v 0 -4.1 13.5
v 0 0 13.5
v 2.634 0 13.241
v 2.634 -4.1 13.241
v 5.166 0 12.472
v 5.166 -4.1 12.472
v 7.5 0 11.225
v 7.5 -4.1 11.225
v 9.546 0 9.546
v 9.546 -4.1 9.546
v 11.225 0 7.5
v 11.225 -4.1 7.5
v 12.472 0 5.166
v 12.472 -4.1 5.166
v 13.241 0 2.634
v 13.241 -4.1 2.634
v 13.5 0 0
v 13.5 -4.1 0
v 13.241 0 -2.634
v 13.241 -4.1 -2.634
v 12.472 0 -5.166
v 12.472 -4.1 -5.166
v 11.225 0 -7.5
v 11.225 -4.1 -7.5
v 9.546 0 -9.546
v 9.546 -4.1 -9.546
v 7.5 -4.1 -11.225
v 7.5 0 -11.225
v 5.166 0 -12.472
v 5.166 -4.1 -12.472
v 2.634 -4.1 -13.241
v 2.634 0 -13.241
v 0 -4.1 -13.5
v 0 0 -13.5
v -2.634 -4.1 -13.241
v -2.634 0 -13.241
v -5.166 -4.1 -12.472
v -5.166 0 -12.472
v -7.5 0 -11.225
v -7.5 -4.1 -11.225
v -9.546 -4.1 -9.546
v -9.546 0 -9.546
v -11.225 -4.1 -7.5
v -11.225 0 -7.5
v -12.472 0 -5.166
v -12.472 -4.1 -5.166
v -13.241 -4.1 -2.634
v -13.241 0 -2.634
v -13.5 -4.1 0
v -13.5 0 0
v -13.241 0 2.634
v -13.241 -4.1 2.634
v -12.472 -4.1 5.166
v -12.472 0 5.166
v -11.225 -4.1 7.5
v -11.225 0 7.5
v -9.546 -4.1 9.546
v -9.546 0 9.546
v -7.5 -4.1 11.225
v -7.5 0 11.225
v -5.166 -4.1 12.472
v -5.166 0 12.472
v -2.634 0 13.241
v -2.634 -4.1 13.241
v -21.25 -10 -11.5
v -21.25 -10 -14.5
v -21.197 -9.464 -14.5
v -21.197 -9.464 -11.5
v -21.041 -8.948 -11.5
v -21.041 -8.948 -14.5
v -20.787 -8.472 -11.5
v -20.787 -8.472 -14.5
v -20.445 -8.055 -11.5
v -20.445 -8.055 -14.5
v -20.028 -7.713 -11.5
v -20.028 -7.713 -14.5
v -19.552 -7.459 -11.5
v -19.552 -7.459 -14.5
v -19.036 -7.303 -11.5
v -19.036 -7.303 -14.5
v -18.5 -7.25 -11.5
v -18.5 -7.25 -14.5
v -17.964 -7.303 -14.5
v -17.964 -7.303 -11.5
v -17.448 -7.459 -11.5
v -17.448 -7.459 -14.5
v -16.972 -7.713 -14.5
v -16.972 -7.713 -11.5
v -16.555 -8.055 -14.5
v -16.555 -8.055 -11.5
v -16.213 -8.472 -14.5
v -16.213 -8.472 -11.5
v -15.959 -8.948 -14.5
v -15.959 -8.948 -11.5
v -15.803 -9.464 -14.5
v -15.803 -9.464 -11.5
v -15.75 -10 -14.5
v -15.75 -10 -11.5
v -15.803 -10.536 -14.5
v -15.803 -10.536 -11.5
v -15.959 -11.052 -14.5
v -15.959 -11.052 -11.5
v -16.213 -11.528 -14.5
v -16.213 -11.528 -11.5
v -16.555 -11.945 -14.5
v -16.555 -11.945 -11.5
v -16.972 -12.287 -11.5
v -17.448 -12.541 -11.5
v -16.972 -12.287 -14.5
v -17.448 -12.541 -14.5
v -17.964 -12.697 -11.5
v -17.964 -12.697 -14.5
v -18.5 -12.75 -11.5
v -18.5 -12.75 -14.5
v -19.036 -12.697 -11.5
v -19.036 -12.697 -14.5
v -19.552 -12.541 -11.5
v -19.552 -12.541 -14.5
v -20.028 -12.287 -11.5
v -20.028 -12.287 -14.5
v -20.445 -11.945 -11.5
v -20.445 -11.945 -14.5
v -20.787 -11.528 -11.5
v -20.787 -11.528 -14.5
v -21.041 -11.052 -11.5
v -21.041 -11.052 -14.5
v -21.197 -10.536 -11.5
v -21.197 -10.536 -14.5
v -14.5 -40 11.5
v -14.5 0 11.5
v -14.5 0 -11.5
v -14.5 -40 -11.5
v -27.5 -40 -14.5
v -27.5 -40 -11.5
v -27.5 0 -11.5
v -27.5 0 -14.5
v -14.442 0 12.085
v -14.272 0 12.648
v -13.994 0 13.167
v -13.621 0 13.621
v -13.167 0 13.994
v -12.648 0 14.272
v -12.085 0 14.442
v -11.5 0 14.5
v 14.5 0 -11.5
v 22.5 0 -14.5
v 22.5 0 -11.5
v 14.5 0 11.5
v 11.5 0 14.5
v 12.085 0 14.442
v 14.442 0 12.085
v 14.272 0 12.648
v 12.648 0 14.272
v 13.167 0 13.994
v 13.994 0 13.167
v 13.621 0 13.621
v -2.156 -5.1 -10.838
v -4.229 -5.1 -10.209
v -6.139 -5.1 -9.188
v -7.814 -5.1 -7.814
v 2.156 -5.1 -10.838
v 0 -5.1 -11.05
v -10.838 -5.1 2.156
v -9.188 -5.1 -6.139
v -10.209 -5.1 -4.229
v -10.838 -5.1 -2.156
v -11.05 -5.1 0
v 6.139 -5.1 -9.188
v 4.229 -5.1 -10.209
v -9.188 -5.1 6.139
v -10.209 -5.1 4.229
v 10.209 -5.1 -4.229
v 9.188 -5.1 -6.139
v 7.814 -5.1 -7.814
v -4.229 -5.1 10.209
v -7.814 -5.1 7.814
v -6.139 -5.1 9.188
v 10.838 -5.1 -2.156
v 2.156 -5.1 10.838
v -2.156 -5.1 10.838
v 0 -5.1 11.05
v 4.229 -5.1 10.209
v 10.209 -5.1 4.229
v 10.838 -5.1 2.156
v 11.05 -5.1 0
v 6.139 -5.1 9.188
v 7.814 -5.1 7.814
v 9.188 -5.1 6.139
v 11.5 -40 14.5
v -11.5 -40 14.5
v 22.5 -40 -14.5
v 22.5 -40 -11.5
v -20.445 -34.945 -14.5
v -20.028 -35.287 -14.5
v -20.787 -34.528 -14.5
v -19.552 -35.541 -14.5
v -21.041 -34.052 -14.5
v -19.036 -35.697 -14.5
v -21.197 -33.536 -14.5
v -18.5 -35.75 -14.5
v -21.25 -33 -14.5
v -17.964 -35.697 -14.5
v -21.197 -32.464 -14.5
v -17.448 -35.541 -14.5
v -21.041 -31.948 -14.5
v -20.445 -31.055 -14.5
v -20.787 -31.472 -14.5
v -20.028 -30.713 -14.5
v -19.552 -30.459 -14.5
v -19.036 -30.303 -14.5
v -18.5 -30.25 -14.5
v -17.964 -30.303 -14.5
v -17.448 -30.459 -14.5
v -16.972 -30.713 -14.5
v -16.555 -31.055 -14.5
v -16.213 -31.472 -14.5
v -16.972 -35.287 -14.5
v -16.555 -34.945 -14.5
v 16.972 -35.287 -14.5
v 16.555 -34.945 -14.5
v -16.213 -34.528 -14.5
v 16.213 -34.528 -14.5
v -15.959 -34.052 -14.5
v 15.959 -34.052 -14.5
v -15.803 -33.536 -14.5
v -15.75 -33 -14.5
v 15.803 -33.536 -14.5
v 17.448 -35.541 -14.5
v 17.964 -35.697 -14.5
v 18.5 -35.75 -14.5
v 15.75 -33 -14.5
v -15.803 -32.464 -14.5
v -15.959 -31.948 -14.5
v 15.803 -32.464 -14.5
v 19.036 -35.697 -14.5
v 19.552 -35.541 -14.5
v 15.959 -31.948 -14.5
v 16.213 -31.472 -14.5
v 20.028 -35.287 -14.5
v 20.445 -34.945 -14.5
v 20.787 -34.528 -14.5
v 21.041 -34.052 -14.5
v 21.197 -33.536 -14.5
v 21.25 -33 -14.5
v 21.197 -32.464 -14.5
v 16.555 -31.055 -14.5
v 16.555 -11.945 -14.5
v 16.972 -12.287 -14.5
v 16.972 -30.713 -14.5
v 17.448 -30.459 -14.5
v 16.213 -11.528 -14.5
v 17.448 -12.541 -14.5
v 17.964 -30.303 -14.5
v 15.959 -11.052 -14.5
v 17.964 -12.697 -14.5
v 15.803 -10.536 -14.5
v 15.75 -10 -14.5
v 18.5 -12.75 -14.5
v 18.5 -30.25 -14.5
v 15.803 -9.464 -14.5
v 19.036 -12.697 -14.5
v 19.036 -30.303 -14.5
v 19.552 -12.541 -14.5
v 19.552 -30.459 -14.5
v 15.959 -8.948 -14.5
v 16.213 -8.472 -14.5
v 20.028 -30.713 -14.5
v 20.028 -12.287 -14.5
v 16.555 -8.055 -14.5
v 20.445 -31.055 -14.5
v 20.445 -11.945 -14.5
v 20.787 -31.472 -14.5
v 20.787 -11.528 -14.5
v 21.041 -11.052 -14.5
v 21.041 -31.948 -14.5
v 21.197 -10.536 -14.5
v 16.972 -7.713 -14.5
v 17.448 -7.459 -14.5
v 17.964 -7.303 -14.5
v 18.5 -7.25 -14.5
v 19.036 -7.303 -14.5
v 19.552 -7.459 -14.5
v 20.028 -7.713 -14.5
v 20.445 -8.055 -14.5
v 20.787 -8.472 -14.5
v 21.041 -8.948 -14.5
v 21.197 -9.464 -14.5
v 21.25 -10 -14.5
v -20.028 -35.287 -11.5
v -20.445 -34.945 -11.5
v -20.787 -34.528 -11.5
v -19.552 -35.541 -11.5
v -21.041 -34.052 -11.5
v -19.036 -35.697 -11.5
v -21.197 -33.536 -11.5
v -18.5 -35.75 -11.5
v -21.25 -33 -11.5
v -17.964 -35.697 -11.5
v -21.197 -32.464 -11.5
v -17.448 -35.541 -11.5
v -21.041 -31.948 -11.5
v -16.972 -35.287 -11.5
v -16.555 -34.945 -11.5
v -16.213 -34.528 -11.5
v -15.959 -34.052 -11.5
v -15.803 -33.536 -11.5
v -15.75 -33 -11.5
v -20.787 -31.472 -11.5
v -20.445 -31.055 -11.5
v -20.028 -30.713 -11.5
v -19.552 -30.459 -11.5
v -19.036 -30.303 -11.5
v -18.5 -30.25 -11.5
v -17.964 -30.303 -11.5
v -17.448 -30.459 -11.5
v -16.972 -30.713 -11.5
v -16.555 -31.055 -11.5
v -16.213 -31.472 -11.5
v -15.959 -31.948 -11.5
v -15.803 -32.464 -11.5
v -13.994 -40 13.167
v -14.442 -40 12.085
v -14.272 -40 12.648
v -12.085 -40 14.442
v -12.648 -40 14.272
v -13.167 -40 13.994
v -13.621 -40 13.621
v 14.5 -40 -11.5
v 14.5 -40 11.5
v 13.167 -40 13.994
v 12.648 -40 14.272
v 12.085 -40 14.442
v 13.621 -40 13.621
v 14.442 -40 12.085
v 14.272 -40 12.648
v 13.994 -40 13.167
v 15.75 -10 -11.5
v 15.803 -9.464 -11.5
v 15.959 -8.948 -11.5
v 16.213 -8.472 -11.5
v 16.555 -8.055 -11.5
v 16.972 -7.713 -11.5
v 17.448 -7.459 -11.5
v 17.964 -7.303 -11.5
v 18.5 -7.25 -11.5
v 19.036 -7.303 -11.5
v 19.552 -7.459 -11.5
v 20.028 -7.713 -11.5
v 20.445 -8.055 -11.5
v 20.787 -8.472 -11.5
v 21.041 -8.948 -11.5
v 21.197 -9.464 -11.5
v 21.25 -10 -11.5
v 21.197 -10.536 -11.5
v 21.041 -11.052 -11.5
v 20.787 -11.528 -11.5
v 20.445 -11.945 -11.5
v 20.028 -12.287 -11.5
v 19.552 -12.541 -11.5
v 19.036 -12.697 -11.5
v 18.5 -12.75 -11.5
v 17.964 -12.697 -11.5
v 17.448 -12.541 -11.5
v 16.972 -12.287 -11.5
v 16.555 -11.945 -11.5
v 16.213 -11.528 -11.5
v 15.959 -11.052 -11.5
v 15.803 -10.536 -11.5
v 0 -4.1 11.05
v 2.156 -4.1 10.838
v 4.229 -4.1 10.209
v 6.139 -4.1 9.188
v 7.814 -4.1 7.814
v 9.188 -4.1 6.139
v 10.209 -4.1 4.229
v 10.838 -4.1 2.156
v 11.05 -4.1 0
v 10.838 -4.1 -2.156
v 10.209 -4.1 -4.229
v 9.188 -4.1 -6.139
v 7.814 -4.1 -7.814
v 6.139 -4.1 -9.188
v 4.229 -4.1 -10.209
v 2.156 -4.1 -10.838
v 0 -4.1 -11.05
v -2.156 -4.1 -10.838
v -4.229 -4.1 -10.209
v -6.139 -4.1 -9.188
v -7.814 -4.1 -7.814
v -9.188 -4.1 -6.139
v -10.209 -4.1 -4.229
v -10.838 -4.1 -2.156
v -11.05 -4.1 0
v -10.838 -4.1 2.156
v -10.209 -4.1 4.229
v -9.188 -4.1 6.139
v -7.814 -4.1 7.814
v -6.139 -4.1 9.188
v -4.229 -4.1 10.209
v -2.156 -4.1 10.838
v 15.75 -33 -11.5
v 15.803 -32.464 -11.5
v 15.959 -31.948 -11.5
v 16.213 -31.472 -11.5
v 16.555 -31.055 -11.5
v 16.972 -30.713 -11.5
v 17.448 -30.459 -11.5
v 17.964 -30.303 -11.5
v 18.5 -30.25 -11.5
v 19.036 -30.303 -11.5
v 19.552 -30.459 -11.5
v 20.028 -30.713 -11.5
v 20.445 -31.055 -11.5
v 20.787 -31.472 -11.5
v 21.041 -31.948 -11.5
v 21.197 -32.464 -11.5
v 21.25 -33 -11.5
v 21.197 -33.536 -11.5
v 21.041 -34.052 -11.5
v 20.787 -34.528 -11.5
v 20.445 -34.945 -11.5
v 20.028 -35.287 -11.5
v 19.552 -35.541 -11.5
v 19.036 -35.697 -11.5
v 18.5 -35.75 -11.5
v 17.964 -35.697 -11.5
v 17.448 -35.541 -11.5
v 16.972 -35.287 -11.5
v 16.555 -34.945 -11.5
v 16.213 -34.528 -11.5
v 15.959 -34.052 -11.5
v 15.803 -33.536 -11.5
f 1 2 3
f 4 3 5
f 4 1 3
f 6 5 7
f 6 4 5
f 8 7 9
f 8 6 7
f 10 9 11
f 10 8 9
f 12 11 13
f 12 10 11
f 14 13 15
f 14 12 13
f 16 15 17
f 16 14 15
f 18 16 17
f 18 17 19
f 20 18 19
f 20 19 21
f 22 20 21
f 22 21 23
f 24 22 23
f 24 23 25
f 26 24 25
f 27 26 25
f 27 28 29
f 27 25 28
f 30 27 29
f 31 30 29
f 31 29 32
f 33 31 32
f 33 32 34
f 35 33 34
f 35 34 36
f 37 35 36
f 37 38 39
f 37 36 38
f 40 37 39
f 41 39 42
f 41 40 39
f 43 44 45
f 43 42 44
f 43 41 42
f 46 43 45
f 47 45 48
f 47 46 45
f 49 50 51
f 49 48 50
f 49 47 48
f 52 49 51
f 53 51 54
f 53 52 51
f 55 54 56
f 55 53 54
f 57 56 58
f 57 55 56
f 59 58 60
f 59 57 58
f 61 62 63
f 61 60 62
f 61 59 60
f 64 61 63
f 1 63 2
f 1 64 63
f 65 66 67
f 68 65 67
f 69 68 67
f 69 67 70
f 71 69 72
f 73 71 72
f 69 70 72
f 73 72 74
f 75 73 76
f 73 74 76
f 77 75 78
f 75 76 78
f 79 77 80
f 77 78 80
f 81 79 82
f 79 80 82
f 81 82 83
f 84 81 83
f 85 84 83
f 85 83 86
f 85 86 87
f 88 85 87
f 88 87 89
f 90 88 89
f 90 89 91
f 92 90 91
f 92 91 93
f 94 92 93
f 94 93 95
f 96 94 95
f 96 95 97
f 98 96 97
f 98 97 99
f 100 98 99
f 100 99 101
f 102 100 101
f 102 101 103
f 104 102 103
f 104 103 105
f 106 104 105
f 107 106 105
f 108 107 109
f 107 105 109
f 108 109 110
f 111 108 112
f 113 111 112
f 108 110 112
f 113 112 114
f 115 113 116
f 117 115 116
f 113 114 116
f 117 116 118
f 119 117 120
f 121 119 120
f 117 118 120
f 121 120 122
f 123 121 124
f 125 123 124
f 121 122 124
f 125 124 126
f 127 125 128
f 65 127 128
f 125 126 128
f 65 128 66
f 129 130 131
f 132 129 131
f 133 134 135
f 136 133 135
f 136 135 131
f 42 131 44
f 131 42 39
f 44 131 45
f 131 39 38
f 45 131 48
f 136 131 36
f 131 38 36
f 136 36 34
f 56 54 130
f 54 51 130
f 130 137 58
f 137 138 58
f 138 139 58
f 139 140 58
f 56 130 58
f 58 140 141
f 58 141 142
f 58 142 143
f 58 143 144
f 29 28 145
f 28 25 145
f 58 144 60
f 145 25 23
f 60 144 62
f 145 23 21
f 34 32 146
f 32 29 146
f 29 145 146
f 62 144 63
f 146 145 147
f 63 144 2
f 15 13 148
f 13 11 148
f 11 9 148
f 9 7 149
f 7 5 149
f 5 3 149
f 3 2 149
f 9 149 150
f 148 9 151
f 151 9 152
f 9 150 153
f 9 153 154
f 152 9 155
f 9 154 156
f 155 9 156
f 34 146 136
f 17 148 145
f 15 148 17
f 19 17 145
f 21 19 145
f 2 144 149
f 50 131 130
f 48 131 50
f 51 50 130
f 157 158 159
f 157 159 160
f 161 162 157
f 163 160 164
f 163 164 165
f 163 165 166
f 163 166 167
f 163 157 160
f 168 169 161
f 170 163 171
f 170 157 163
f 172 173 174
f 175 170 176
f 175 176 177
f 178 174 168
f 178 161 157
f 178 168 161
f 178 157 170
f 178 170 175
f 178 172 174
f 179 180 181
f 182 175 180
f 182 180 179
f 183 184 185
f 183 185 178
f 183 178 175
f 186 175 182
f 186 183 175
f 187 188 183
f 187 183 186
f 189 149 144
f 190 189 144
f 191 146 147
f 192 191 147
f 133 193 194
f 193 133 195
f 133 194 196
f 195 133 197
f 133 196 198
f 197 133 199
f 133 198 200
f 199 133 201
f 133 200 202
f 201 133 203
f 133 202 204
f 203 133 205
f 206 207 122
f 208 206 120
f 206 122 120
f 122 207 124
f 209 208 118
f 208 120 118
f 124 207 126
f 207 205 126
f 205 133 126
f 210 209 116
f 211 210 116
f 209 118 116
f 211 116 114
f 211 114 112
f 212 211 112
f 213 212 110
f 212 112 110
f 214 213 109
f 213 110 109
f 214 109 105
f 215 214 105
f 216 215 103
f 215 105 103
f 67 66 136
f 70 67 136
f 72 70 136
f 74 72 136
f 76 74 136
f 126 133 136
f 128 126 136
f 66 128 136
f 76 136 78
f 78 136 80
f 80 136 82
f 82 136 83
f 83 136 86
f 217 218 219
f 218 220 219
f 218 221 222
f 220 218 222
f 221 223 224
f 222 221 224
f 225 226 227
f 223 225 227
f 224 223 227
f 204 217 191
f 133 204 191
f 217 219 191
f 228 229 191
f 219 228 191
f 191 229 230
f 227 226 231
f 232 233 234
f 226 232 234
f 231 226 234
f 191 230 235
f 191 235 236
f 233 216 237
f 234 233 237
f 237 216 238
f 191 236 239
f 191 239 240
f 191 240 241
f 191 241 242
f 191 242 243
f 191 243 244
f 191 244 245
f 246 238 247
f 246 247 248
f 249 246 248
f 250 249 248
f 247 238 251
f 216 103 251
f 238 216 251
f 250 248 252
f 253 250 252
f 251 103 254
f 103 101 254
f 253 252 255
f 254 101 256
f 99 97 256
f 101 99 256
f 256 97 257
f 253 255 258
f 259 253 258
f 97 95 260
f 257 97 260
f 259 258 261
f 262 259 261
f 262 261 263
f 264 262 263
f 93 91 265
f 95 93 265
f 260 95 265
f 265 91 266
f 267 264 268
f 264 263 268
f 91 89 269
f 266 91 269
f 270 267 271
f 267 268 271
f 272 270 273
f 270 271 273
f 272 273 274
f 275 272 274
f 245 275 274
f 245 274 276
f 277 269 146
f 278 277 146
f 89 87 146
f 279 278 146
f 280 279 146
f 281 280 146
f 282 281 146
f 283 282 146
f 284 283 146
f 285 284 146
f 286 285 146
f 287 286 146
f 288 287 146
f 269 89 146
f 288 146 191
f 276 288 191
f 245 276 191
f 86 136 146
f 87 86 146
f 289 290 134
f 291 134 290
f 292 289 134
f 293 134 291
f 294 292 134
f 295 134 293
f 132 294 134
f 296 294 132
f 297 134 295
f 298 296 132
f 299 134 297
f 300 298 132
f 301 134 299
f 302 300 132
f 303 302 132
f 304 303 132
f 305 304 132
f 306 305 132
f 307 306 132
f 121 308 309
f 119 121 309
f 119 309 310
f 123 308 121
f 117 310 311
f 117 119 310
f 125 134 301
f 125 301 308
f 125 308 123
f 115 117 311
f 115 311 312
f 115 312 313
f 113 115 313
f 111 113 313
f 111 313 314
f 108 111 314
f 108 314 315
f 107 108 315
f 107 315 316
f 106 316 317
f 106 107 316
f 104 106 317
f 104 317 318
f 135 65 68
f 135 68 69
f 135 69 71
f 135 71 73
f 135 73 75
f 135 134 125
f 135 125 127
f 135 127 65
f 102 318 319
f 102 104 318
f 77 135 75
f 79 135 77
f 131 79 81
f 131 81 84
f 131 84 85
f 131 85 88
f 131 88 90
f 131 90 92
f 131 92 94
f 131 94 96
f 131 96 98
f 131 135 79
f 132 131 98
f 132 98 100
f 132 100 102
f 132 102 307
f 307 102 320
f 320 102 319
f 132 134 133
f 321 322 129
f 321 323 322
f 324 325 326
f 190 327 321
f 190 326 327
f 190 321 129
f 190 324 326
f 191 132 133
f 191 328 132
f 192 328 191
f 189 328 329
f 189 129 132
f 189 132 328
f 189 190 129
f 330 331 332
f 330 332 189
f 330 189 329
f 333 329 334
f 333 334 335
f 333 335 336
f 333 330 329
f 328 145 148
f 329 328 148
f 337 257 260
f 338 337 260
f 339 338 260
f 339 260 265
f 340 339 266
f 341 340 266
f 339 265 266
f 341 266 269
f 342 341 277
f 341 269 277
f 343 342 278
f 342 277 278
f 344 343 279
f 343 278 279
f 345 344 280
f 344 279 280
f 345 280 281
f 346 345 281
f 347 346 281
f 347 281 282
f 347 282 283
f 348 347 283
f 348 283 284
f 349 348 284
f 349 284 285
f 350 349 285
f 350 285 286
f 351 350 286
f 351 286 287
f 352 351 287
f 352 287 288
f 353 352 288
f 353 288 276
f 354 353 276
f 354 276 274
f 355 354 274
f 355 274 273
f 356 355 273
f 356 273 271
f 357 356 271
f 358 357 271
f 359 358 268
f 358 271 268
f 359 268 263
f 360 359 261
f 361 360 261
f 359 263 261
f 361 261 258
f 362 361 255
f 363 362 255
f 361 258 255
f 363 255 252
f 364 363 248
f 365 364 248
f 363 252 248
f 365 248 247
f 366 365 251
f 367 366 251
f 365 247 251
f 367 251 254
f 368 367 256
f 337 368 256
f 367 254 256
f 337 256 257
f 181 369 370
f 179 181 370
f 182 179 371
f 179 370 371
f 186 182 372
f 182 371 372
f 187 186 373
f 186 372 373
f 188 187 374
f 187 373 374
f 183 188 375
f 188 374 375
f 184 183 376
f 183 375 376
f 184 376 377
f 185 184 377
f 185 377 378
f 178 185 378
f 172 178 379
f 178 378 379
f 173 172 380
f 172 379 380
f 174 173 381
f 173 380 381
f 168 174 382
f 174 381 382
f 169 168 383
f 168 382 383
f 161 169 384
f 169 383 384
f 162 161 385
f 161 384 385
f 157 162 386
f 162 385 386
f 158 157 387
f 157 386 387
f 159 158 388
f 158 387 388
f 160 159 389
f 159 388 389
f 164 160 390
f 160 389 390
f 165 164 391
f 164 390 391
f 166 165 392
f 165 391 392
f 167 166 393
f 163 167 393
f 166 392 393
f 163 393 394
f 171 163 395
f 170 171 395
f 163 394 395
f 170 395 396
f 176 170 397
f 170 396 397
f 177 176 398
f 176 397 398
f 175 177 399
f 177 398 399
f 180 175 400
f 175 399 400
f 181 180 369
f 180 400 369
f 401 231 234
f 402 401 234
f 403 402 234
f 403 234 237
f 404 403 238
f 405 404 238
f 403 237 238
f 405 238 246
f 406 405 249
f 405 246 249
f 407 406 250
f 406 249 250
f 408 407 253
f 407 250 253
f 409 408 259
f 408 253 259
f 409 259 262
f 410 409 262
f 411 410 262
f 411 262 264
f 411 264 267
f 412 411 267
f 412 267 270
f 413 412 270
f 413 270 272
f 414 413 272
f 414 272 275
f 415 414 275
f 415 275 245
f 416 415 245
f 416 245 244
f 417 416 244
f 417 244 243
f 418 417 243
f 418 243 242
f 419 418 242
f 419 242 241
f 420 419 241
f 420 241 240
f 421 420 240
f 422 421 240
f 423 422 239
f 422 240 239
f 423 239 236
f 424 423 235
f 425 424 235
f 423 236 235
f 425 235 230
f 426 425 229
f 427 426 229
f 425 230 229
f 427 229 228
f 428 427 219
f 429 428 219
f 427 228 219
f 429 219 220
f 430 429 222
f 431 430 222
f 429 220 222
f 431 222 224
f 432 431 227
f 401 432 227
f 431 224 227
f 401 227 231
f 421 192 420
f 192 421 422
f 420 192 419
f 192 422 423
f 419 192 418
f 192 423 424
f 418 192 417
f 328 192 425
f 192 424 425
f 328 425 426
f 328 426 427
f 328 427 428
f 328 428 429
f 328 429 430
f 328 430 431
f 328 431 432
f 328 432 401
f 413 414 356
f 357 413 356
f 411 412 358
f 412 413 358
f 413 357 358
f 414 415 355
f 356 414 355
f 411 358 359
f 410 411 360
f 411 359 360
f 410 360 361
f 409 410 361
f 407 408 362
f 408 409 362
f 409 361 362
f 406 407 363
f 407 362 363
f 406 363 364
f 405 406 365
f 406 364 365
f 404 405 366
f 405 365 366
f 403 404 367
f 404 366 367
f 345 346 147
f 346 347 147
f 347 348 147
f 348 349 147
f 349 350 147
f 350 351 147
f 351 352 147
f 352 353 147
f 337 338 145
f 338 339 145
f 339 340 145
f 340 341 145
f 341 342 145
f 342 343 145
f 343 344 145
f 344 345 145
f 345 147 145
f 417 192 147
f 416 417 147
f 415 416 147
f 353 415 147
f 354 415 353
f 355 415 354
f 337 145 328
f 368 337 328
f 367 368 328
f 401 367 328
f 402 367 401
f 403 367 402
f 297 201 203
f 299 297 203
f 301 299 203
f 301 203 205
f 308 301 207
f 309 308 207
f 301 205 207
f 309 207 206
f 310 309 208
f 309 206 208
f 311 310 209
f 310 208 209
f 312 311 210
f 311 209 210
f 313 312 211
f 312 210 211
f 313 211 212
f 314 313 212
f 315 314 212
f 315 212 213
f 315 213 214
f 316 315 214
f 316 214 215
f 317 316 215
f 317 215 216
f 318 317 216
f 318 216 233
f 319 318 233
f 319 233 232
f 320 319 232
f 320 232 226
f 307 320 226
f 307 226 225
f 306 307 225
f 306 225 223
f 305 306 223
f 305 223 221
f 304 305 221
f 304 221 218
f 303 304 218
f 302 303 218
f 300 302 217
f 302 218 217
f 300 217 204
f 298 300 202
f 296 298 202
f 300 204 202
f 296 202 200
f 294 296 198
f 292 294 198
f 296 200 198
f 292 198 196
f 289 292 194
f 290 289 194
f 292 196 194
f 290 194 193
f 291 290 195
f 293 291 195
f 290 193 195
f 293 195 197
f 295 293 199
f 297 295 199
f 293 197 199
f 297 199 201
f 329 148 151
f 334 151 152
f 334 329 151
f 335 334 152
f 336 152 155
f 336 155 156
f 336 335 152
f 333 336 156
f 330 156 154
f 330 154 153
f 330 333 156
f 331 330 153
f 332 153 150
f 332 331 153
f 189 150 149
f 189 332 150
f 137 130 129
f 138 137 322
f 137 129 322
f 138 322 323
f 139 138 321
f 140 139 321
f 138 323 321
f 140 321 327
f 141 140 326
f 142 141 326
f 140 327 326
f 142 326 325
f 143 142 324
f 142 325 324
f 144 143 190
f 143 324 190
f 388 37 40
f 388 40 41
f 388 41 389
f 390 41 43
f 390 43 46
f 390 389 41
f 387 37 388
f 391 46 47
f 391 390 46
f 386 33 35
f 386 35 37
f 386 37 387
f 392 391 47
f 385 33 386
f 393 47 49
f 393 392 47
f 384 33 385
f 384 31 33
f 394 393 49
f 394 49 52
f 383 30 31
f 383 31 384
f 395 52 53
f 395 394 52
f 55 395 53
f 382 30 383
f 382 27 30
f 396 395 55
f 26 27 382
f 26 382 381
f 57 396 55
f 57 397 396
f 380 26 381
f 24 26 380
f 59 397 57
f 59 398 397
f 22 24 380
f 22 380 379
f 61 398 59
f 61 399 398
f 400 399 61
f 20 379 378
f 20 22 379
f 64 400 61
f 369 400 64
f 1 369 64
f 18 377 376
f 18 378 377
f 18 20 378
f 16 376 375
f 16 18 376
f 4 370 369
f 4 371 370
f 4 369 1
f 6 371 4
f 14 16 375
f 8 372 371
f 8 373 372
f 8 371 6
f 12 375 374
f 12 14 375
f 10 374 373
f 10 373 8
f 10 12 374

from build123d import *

# Parameters (mm, degrees)
BOSS_EXTRUDE1_DEPTH     = 40
CUT_EXTRUDE1_DEPTH      = 49.130032204
CUT_EXTRUDE1_DEPTH_BACK = 4.1
SKETCH2_R               = 13.5
SKETCH7_R               = 11.05
CUT_EXTRUDE3_DEPTH      = 1
M5_CLEARANCE_HOLE2_D    = 5.5
FILLET1_R               = 3
SKETCH8_W               = 5
SKETCH8_H               = 40
BOSS_EXTRUDE2_DEPTH     = 3


with BuildPart() as part:
    # Sketch1 → Boss-Extrude1 (new body)
    with BuildSketch(Plane(origin=(0, 0, 0), x_dir=(1, 0, 0), z_dir=(0, 1, 0))):
        Polygon((-22.5, 14.5), (22.5, 14.5), (22.5, 11.5), (14.5, 11.5), (14.5, -14.5), (-14.5, -14.5), (-14.5, 11.5), (-22.5, 11.5), align=None)
    extrude(amount=-BOSS_EXTRUDE1_DEPTH)

    # Sketch2 → Cut-Extrude1 (cut, two sides: drawn at the far end of the back side and taken through both)
    with BuildSketch(Plane(origin=(0, 0, 0), x_dir=(1, 0, 0), z_dir=(0, 1, 0)).offset(-CUT_EXTRUDE1_DEPTH_BACK)):
        with Locations(Location((0, 0, 0), (0, 0, 270))):
            Circle(SKETCH2_R)
    extrude(amount=CUT_EXTRUDE1_DEPTH + CUT_EXTRUDE1_DEPTH_BACK, mode=Mode.SUBTRACT)

    # Sketch7 → Cut-Extrude3 (cut)
    with BuildSketch(Plane(origin=(0, -4.1, 0), x_dir=(1, 0, 0), z_dir=(0, 1, 0))):
        with Locations(Location((0, 0, 0), (0, 0, 270))):
            Circle(SKETCH7_R)
    extrude(amount=-CUT_EXTRUDE3_DEPTH, mode=Mode.SUBTRACT)

    # M5 Clearance Hole2 (through all)
    with Locations(Plane.XY.offset(-11.5)):
        with Locations((18.5, -33), (-18.5, -10), (18.5, -10), (-18.5, -33)):
            Hole(M5_CLEARANCE_HOLE2_D / 2)

    # Fillet1
    fillet1_edges = [part.edges().sort_by_distance(p)[0] for p in [
        (-14.5, -20, 14.5),
        (14.5, -20, 14.5),
    ]]
    fillet(fillet1_edges, radius=FILLET1_R)

    # Sketch8 → Boss-Extrude2 (add)
    with BuildSketch(Plane.XY.offset(-11.5)):
        with Locations((-25, -20)):
            Rectangle(SKETCH8_W, SKETCH8_H)
    extrude(amount=-BOSS_EXTRUDE2_DEPTH)


solid = part.part
